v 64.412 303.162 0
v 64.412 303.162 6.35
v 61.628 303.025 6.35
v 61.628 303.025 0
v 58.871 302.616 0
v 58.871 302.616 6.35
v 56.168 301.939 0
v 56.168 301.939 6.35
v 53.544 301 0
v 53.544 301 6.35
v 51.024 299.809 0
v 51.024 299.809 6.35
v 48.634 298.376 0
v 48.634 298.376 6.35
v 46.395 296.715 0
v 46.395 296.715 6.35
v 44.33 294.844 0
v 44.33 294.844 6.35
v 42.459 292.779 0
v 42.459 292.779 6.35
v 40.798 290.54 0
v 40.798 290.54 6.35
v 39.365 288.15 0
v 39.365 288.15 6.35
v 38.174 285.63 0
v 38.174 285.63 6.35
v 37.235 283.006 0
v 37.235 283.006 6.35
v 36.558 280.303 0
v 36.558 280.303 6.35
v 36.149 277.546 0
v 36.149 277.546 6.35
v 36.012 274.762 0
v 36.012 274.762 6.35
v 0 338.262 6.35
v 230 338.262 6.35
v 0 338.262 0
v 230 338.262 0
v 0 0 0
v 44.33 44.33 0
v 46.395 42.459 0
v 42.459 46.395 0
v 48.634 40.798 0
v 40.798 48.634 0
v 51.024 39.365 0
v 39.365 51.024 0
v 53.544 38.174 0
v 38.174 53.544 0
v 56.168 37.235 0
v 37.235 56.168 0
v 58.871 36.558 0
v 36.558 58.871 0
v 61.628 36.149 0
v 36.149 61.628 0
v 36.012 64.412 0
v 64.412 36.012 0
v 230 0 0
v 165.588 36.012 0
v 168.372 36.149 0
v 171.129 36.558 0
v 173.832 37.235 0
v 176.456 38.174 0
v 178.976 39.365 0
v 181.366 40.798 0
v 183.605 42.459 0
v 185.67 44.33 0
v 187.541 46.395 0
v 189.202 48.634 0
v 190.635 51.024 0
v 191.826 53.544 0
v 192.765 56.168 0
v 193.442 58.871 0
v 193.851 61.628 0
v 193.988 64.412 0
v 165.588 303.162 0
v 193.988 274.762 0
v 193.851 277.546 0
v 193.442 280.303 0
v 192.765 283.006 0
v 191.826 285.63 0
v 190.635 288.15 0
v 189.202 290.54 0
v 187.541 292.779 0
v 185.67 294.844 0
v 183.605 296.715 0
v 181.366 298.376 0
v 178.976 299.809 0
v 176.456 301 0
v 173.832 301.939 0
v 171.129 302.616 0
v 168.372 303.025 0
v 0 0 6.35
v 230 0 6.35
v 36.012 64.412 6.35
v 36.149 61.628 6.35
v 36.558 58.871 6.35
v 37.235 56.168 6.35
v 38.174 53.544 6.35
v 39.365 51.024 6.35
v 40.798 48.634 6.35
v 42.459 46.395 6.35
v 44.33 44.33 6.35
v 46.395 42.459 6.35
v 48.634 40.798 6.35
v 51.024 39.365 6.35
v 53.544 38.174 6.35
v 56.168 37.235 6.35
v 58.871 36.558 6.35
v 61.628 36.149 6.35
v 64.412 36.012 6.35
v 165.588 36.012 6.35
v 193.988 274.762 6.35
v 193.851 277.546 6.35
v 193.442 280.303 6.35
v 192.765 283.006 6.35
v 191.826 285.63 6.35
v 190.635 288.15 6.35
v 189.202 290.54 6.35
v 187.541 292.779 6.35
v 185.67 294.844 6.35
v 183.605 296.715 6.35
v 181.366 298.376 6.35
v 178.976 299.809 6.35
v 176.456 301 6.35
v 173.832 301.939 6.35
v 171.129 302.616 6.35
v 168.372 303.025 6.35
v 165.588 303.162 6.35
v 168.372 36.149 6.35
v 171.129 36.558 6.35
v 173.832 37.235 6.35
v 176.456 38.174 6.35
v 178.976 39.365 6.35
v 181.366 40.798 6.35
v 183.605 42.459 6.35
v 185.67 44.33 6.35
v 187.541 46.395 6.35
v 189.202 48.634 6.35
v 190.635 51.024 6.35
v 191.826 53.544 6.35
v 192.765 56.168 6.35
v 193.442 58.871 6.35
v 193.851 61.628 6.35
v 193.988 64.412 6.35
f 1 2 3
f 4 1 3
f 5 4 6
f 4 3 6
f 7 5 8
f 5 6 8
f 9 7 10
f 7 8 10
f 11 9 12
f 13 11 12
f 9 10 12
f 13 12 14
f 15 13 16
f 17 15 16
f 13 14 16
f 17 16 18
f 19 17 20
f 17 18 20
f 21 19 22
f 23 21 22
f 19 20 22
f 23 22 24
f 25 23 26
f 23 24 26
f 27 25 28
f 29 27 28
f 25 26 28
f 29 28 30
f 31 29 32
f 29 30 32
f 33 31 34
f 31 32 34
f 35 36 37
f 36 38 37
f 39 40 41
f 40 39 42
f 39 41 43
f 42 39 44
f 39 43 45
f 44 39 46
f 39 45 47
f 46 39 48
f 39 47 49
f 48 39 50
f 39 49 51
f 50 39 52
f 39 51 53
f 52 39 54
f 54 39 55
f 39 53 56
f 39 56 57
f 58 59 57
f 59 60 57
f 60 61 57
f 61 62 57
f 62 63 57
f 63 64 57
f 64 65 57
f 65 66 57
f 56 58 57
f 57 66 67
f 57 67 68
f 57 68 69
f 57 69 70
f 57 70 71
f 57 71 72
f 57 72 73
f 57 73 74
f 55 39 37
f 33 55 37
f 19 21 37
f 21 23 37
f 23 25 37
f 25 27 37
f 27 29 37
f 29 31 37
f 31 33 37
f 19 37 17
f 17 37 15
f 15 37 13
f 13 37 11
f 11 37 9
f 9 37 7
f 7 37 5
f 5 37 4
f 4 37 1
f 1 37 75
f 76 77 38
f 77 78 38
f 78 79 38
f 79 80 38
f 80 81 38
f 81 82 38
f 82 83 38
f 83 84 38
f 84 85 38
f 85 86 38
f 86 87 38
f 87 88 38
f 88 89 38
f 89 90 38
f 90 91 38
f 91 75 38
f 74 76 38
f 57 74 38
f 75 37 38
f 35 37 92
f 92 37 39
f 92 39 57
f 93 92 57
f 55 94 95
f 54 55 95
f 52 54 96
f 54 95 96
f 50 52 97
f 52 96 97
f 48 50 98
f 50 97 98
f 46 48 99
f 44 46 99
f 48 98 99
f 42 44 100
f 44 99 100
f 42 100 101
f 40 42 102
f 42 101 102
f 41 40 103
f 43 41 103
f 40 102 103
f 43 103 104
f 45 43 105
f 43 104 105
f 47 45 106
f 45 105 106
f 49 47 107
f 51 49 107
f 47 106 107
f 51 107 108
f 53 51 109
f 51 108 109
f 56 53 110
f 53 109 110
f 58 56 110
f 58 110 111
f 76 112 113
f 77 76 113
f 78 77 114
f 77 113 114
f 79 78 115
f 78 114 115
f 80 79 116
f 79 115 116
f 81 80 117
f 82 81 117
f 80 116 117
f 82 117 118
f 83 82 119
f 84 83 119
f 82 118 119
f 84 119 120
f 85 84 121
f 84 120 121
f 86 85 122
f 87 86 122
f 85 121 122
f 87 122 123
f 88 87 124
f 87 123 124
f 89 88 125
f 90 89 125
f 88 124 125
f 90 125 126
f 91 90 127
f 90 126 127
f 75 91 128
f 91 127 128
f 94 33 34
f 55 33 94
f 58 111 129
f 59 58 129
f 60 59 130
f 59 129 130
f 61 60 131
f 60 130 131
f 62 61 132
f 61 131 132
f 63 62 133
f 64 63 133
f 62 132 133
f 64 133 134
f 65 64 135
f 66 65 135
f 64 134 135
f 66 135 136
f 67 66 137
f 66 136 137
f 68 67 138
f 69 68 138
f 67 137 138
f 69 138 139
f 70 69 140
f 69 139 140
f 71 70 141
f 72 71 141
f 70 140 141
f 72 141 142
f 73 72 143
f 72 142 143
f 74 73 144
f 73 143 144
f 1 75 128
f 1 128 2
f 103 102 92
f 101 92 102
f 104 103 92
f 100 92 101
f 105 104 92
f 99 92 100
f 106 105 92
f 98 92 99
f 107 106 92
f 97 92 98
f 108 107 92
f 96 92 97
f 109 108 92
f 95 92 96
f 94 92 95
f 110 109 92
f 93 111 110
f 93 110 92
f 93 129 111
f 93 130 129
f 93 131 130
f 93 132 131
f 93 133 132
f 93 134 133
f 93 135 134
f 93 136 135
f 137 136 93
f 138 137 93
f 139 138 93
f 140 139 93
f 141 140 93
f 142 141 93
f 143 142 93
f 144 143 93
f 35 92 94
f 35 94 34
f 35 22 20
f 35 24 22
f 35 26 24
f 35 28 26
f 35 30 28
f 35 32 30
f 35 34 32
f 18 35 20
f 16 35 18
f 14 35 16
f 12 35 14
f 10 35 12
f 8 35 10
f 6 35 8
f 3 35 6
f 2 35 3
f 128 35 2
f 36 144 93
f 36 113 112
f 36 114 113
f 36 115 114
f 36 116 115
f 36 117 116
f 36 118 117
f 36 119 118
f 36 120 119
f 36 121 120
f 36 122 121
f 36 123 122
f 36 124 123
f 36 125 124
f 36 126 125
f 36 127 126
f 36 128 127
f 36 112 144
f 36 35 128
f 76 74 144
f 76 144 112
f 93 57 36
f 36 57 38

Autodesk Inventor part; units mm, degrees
ref_plane "YZ Plane" through (0, 0, 0) normal (1, 0, 0) x (0, 1, 0)
ref_plane "XZ Plane" through (0, 0, 0) normal (0, 1, 0) x (-1, 0, 0)
ref_plane "XY Plane" through (0, 0, 0) normal (0, 0, 1) x (1, 0, 0)
sketch "Sketch1" plane through (0, 0, 0) normal (0, 0, 1) x (1, 0, 0)
  line L0 (0, 0) -> (230, 0)
  line L1 (230, 0) -> (230, 338.262)
  line L2 (230, 338.262) -> (0, 338.262)
  line L3 (0, 338.262) -> (0, 0)
  line L4 (39.012, 39.012) -> (190.988, 39.012)
  line L5 (190.988, 39.012) -> (190.988, 300.162)
  line L6 (190.988, 300.162) -> (39.012, 300.162)
  line L7 (39.012, 300.162) -> (39.012, 39.012)
  dimension "d0" = 230
  dimension "d1" = 338.262
  dimension "d2" = 39.012
  dimension "d3" = 39.012
  dimension "d4" = 39.012
  dimension "d5" = 38.1
extrude "Extrusion1" add sketch "Sketch1" along normal blind 6.35
fillet "Fillet2" radius 25.4 4 edges at (190.988, 39.012, 3.175) (39.012, 39.012, 3.175) (39.012, 300.162, 3.175) (190.988, 300.162, 3.175)
thicken "Thicken1" operation add thickness 3 both sides no extend neighbours yes toward (-1, 0, 0) faces at (39.012, 134.5287, 4.2333) (98.1373, 300.162, 2.1167) (190.988, 204.6453, 4.2333) (131.8627, 39.012, 2.1167) (184.2075, 47.1356, 2.1167) (60.6263, 39.2957, 2.1167) (40.7678, 284.0417, 2.1167) (189.2322, 284.0417, 2.1167)
equation "\"d3\" = d2"
equation "\"d4\" = d2"
properties part number "Door Panel Front Foam" material "Polyurethane Foam"
